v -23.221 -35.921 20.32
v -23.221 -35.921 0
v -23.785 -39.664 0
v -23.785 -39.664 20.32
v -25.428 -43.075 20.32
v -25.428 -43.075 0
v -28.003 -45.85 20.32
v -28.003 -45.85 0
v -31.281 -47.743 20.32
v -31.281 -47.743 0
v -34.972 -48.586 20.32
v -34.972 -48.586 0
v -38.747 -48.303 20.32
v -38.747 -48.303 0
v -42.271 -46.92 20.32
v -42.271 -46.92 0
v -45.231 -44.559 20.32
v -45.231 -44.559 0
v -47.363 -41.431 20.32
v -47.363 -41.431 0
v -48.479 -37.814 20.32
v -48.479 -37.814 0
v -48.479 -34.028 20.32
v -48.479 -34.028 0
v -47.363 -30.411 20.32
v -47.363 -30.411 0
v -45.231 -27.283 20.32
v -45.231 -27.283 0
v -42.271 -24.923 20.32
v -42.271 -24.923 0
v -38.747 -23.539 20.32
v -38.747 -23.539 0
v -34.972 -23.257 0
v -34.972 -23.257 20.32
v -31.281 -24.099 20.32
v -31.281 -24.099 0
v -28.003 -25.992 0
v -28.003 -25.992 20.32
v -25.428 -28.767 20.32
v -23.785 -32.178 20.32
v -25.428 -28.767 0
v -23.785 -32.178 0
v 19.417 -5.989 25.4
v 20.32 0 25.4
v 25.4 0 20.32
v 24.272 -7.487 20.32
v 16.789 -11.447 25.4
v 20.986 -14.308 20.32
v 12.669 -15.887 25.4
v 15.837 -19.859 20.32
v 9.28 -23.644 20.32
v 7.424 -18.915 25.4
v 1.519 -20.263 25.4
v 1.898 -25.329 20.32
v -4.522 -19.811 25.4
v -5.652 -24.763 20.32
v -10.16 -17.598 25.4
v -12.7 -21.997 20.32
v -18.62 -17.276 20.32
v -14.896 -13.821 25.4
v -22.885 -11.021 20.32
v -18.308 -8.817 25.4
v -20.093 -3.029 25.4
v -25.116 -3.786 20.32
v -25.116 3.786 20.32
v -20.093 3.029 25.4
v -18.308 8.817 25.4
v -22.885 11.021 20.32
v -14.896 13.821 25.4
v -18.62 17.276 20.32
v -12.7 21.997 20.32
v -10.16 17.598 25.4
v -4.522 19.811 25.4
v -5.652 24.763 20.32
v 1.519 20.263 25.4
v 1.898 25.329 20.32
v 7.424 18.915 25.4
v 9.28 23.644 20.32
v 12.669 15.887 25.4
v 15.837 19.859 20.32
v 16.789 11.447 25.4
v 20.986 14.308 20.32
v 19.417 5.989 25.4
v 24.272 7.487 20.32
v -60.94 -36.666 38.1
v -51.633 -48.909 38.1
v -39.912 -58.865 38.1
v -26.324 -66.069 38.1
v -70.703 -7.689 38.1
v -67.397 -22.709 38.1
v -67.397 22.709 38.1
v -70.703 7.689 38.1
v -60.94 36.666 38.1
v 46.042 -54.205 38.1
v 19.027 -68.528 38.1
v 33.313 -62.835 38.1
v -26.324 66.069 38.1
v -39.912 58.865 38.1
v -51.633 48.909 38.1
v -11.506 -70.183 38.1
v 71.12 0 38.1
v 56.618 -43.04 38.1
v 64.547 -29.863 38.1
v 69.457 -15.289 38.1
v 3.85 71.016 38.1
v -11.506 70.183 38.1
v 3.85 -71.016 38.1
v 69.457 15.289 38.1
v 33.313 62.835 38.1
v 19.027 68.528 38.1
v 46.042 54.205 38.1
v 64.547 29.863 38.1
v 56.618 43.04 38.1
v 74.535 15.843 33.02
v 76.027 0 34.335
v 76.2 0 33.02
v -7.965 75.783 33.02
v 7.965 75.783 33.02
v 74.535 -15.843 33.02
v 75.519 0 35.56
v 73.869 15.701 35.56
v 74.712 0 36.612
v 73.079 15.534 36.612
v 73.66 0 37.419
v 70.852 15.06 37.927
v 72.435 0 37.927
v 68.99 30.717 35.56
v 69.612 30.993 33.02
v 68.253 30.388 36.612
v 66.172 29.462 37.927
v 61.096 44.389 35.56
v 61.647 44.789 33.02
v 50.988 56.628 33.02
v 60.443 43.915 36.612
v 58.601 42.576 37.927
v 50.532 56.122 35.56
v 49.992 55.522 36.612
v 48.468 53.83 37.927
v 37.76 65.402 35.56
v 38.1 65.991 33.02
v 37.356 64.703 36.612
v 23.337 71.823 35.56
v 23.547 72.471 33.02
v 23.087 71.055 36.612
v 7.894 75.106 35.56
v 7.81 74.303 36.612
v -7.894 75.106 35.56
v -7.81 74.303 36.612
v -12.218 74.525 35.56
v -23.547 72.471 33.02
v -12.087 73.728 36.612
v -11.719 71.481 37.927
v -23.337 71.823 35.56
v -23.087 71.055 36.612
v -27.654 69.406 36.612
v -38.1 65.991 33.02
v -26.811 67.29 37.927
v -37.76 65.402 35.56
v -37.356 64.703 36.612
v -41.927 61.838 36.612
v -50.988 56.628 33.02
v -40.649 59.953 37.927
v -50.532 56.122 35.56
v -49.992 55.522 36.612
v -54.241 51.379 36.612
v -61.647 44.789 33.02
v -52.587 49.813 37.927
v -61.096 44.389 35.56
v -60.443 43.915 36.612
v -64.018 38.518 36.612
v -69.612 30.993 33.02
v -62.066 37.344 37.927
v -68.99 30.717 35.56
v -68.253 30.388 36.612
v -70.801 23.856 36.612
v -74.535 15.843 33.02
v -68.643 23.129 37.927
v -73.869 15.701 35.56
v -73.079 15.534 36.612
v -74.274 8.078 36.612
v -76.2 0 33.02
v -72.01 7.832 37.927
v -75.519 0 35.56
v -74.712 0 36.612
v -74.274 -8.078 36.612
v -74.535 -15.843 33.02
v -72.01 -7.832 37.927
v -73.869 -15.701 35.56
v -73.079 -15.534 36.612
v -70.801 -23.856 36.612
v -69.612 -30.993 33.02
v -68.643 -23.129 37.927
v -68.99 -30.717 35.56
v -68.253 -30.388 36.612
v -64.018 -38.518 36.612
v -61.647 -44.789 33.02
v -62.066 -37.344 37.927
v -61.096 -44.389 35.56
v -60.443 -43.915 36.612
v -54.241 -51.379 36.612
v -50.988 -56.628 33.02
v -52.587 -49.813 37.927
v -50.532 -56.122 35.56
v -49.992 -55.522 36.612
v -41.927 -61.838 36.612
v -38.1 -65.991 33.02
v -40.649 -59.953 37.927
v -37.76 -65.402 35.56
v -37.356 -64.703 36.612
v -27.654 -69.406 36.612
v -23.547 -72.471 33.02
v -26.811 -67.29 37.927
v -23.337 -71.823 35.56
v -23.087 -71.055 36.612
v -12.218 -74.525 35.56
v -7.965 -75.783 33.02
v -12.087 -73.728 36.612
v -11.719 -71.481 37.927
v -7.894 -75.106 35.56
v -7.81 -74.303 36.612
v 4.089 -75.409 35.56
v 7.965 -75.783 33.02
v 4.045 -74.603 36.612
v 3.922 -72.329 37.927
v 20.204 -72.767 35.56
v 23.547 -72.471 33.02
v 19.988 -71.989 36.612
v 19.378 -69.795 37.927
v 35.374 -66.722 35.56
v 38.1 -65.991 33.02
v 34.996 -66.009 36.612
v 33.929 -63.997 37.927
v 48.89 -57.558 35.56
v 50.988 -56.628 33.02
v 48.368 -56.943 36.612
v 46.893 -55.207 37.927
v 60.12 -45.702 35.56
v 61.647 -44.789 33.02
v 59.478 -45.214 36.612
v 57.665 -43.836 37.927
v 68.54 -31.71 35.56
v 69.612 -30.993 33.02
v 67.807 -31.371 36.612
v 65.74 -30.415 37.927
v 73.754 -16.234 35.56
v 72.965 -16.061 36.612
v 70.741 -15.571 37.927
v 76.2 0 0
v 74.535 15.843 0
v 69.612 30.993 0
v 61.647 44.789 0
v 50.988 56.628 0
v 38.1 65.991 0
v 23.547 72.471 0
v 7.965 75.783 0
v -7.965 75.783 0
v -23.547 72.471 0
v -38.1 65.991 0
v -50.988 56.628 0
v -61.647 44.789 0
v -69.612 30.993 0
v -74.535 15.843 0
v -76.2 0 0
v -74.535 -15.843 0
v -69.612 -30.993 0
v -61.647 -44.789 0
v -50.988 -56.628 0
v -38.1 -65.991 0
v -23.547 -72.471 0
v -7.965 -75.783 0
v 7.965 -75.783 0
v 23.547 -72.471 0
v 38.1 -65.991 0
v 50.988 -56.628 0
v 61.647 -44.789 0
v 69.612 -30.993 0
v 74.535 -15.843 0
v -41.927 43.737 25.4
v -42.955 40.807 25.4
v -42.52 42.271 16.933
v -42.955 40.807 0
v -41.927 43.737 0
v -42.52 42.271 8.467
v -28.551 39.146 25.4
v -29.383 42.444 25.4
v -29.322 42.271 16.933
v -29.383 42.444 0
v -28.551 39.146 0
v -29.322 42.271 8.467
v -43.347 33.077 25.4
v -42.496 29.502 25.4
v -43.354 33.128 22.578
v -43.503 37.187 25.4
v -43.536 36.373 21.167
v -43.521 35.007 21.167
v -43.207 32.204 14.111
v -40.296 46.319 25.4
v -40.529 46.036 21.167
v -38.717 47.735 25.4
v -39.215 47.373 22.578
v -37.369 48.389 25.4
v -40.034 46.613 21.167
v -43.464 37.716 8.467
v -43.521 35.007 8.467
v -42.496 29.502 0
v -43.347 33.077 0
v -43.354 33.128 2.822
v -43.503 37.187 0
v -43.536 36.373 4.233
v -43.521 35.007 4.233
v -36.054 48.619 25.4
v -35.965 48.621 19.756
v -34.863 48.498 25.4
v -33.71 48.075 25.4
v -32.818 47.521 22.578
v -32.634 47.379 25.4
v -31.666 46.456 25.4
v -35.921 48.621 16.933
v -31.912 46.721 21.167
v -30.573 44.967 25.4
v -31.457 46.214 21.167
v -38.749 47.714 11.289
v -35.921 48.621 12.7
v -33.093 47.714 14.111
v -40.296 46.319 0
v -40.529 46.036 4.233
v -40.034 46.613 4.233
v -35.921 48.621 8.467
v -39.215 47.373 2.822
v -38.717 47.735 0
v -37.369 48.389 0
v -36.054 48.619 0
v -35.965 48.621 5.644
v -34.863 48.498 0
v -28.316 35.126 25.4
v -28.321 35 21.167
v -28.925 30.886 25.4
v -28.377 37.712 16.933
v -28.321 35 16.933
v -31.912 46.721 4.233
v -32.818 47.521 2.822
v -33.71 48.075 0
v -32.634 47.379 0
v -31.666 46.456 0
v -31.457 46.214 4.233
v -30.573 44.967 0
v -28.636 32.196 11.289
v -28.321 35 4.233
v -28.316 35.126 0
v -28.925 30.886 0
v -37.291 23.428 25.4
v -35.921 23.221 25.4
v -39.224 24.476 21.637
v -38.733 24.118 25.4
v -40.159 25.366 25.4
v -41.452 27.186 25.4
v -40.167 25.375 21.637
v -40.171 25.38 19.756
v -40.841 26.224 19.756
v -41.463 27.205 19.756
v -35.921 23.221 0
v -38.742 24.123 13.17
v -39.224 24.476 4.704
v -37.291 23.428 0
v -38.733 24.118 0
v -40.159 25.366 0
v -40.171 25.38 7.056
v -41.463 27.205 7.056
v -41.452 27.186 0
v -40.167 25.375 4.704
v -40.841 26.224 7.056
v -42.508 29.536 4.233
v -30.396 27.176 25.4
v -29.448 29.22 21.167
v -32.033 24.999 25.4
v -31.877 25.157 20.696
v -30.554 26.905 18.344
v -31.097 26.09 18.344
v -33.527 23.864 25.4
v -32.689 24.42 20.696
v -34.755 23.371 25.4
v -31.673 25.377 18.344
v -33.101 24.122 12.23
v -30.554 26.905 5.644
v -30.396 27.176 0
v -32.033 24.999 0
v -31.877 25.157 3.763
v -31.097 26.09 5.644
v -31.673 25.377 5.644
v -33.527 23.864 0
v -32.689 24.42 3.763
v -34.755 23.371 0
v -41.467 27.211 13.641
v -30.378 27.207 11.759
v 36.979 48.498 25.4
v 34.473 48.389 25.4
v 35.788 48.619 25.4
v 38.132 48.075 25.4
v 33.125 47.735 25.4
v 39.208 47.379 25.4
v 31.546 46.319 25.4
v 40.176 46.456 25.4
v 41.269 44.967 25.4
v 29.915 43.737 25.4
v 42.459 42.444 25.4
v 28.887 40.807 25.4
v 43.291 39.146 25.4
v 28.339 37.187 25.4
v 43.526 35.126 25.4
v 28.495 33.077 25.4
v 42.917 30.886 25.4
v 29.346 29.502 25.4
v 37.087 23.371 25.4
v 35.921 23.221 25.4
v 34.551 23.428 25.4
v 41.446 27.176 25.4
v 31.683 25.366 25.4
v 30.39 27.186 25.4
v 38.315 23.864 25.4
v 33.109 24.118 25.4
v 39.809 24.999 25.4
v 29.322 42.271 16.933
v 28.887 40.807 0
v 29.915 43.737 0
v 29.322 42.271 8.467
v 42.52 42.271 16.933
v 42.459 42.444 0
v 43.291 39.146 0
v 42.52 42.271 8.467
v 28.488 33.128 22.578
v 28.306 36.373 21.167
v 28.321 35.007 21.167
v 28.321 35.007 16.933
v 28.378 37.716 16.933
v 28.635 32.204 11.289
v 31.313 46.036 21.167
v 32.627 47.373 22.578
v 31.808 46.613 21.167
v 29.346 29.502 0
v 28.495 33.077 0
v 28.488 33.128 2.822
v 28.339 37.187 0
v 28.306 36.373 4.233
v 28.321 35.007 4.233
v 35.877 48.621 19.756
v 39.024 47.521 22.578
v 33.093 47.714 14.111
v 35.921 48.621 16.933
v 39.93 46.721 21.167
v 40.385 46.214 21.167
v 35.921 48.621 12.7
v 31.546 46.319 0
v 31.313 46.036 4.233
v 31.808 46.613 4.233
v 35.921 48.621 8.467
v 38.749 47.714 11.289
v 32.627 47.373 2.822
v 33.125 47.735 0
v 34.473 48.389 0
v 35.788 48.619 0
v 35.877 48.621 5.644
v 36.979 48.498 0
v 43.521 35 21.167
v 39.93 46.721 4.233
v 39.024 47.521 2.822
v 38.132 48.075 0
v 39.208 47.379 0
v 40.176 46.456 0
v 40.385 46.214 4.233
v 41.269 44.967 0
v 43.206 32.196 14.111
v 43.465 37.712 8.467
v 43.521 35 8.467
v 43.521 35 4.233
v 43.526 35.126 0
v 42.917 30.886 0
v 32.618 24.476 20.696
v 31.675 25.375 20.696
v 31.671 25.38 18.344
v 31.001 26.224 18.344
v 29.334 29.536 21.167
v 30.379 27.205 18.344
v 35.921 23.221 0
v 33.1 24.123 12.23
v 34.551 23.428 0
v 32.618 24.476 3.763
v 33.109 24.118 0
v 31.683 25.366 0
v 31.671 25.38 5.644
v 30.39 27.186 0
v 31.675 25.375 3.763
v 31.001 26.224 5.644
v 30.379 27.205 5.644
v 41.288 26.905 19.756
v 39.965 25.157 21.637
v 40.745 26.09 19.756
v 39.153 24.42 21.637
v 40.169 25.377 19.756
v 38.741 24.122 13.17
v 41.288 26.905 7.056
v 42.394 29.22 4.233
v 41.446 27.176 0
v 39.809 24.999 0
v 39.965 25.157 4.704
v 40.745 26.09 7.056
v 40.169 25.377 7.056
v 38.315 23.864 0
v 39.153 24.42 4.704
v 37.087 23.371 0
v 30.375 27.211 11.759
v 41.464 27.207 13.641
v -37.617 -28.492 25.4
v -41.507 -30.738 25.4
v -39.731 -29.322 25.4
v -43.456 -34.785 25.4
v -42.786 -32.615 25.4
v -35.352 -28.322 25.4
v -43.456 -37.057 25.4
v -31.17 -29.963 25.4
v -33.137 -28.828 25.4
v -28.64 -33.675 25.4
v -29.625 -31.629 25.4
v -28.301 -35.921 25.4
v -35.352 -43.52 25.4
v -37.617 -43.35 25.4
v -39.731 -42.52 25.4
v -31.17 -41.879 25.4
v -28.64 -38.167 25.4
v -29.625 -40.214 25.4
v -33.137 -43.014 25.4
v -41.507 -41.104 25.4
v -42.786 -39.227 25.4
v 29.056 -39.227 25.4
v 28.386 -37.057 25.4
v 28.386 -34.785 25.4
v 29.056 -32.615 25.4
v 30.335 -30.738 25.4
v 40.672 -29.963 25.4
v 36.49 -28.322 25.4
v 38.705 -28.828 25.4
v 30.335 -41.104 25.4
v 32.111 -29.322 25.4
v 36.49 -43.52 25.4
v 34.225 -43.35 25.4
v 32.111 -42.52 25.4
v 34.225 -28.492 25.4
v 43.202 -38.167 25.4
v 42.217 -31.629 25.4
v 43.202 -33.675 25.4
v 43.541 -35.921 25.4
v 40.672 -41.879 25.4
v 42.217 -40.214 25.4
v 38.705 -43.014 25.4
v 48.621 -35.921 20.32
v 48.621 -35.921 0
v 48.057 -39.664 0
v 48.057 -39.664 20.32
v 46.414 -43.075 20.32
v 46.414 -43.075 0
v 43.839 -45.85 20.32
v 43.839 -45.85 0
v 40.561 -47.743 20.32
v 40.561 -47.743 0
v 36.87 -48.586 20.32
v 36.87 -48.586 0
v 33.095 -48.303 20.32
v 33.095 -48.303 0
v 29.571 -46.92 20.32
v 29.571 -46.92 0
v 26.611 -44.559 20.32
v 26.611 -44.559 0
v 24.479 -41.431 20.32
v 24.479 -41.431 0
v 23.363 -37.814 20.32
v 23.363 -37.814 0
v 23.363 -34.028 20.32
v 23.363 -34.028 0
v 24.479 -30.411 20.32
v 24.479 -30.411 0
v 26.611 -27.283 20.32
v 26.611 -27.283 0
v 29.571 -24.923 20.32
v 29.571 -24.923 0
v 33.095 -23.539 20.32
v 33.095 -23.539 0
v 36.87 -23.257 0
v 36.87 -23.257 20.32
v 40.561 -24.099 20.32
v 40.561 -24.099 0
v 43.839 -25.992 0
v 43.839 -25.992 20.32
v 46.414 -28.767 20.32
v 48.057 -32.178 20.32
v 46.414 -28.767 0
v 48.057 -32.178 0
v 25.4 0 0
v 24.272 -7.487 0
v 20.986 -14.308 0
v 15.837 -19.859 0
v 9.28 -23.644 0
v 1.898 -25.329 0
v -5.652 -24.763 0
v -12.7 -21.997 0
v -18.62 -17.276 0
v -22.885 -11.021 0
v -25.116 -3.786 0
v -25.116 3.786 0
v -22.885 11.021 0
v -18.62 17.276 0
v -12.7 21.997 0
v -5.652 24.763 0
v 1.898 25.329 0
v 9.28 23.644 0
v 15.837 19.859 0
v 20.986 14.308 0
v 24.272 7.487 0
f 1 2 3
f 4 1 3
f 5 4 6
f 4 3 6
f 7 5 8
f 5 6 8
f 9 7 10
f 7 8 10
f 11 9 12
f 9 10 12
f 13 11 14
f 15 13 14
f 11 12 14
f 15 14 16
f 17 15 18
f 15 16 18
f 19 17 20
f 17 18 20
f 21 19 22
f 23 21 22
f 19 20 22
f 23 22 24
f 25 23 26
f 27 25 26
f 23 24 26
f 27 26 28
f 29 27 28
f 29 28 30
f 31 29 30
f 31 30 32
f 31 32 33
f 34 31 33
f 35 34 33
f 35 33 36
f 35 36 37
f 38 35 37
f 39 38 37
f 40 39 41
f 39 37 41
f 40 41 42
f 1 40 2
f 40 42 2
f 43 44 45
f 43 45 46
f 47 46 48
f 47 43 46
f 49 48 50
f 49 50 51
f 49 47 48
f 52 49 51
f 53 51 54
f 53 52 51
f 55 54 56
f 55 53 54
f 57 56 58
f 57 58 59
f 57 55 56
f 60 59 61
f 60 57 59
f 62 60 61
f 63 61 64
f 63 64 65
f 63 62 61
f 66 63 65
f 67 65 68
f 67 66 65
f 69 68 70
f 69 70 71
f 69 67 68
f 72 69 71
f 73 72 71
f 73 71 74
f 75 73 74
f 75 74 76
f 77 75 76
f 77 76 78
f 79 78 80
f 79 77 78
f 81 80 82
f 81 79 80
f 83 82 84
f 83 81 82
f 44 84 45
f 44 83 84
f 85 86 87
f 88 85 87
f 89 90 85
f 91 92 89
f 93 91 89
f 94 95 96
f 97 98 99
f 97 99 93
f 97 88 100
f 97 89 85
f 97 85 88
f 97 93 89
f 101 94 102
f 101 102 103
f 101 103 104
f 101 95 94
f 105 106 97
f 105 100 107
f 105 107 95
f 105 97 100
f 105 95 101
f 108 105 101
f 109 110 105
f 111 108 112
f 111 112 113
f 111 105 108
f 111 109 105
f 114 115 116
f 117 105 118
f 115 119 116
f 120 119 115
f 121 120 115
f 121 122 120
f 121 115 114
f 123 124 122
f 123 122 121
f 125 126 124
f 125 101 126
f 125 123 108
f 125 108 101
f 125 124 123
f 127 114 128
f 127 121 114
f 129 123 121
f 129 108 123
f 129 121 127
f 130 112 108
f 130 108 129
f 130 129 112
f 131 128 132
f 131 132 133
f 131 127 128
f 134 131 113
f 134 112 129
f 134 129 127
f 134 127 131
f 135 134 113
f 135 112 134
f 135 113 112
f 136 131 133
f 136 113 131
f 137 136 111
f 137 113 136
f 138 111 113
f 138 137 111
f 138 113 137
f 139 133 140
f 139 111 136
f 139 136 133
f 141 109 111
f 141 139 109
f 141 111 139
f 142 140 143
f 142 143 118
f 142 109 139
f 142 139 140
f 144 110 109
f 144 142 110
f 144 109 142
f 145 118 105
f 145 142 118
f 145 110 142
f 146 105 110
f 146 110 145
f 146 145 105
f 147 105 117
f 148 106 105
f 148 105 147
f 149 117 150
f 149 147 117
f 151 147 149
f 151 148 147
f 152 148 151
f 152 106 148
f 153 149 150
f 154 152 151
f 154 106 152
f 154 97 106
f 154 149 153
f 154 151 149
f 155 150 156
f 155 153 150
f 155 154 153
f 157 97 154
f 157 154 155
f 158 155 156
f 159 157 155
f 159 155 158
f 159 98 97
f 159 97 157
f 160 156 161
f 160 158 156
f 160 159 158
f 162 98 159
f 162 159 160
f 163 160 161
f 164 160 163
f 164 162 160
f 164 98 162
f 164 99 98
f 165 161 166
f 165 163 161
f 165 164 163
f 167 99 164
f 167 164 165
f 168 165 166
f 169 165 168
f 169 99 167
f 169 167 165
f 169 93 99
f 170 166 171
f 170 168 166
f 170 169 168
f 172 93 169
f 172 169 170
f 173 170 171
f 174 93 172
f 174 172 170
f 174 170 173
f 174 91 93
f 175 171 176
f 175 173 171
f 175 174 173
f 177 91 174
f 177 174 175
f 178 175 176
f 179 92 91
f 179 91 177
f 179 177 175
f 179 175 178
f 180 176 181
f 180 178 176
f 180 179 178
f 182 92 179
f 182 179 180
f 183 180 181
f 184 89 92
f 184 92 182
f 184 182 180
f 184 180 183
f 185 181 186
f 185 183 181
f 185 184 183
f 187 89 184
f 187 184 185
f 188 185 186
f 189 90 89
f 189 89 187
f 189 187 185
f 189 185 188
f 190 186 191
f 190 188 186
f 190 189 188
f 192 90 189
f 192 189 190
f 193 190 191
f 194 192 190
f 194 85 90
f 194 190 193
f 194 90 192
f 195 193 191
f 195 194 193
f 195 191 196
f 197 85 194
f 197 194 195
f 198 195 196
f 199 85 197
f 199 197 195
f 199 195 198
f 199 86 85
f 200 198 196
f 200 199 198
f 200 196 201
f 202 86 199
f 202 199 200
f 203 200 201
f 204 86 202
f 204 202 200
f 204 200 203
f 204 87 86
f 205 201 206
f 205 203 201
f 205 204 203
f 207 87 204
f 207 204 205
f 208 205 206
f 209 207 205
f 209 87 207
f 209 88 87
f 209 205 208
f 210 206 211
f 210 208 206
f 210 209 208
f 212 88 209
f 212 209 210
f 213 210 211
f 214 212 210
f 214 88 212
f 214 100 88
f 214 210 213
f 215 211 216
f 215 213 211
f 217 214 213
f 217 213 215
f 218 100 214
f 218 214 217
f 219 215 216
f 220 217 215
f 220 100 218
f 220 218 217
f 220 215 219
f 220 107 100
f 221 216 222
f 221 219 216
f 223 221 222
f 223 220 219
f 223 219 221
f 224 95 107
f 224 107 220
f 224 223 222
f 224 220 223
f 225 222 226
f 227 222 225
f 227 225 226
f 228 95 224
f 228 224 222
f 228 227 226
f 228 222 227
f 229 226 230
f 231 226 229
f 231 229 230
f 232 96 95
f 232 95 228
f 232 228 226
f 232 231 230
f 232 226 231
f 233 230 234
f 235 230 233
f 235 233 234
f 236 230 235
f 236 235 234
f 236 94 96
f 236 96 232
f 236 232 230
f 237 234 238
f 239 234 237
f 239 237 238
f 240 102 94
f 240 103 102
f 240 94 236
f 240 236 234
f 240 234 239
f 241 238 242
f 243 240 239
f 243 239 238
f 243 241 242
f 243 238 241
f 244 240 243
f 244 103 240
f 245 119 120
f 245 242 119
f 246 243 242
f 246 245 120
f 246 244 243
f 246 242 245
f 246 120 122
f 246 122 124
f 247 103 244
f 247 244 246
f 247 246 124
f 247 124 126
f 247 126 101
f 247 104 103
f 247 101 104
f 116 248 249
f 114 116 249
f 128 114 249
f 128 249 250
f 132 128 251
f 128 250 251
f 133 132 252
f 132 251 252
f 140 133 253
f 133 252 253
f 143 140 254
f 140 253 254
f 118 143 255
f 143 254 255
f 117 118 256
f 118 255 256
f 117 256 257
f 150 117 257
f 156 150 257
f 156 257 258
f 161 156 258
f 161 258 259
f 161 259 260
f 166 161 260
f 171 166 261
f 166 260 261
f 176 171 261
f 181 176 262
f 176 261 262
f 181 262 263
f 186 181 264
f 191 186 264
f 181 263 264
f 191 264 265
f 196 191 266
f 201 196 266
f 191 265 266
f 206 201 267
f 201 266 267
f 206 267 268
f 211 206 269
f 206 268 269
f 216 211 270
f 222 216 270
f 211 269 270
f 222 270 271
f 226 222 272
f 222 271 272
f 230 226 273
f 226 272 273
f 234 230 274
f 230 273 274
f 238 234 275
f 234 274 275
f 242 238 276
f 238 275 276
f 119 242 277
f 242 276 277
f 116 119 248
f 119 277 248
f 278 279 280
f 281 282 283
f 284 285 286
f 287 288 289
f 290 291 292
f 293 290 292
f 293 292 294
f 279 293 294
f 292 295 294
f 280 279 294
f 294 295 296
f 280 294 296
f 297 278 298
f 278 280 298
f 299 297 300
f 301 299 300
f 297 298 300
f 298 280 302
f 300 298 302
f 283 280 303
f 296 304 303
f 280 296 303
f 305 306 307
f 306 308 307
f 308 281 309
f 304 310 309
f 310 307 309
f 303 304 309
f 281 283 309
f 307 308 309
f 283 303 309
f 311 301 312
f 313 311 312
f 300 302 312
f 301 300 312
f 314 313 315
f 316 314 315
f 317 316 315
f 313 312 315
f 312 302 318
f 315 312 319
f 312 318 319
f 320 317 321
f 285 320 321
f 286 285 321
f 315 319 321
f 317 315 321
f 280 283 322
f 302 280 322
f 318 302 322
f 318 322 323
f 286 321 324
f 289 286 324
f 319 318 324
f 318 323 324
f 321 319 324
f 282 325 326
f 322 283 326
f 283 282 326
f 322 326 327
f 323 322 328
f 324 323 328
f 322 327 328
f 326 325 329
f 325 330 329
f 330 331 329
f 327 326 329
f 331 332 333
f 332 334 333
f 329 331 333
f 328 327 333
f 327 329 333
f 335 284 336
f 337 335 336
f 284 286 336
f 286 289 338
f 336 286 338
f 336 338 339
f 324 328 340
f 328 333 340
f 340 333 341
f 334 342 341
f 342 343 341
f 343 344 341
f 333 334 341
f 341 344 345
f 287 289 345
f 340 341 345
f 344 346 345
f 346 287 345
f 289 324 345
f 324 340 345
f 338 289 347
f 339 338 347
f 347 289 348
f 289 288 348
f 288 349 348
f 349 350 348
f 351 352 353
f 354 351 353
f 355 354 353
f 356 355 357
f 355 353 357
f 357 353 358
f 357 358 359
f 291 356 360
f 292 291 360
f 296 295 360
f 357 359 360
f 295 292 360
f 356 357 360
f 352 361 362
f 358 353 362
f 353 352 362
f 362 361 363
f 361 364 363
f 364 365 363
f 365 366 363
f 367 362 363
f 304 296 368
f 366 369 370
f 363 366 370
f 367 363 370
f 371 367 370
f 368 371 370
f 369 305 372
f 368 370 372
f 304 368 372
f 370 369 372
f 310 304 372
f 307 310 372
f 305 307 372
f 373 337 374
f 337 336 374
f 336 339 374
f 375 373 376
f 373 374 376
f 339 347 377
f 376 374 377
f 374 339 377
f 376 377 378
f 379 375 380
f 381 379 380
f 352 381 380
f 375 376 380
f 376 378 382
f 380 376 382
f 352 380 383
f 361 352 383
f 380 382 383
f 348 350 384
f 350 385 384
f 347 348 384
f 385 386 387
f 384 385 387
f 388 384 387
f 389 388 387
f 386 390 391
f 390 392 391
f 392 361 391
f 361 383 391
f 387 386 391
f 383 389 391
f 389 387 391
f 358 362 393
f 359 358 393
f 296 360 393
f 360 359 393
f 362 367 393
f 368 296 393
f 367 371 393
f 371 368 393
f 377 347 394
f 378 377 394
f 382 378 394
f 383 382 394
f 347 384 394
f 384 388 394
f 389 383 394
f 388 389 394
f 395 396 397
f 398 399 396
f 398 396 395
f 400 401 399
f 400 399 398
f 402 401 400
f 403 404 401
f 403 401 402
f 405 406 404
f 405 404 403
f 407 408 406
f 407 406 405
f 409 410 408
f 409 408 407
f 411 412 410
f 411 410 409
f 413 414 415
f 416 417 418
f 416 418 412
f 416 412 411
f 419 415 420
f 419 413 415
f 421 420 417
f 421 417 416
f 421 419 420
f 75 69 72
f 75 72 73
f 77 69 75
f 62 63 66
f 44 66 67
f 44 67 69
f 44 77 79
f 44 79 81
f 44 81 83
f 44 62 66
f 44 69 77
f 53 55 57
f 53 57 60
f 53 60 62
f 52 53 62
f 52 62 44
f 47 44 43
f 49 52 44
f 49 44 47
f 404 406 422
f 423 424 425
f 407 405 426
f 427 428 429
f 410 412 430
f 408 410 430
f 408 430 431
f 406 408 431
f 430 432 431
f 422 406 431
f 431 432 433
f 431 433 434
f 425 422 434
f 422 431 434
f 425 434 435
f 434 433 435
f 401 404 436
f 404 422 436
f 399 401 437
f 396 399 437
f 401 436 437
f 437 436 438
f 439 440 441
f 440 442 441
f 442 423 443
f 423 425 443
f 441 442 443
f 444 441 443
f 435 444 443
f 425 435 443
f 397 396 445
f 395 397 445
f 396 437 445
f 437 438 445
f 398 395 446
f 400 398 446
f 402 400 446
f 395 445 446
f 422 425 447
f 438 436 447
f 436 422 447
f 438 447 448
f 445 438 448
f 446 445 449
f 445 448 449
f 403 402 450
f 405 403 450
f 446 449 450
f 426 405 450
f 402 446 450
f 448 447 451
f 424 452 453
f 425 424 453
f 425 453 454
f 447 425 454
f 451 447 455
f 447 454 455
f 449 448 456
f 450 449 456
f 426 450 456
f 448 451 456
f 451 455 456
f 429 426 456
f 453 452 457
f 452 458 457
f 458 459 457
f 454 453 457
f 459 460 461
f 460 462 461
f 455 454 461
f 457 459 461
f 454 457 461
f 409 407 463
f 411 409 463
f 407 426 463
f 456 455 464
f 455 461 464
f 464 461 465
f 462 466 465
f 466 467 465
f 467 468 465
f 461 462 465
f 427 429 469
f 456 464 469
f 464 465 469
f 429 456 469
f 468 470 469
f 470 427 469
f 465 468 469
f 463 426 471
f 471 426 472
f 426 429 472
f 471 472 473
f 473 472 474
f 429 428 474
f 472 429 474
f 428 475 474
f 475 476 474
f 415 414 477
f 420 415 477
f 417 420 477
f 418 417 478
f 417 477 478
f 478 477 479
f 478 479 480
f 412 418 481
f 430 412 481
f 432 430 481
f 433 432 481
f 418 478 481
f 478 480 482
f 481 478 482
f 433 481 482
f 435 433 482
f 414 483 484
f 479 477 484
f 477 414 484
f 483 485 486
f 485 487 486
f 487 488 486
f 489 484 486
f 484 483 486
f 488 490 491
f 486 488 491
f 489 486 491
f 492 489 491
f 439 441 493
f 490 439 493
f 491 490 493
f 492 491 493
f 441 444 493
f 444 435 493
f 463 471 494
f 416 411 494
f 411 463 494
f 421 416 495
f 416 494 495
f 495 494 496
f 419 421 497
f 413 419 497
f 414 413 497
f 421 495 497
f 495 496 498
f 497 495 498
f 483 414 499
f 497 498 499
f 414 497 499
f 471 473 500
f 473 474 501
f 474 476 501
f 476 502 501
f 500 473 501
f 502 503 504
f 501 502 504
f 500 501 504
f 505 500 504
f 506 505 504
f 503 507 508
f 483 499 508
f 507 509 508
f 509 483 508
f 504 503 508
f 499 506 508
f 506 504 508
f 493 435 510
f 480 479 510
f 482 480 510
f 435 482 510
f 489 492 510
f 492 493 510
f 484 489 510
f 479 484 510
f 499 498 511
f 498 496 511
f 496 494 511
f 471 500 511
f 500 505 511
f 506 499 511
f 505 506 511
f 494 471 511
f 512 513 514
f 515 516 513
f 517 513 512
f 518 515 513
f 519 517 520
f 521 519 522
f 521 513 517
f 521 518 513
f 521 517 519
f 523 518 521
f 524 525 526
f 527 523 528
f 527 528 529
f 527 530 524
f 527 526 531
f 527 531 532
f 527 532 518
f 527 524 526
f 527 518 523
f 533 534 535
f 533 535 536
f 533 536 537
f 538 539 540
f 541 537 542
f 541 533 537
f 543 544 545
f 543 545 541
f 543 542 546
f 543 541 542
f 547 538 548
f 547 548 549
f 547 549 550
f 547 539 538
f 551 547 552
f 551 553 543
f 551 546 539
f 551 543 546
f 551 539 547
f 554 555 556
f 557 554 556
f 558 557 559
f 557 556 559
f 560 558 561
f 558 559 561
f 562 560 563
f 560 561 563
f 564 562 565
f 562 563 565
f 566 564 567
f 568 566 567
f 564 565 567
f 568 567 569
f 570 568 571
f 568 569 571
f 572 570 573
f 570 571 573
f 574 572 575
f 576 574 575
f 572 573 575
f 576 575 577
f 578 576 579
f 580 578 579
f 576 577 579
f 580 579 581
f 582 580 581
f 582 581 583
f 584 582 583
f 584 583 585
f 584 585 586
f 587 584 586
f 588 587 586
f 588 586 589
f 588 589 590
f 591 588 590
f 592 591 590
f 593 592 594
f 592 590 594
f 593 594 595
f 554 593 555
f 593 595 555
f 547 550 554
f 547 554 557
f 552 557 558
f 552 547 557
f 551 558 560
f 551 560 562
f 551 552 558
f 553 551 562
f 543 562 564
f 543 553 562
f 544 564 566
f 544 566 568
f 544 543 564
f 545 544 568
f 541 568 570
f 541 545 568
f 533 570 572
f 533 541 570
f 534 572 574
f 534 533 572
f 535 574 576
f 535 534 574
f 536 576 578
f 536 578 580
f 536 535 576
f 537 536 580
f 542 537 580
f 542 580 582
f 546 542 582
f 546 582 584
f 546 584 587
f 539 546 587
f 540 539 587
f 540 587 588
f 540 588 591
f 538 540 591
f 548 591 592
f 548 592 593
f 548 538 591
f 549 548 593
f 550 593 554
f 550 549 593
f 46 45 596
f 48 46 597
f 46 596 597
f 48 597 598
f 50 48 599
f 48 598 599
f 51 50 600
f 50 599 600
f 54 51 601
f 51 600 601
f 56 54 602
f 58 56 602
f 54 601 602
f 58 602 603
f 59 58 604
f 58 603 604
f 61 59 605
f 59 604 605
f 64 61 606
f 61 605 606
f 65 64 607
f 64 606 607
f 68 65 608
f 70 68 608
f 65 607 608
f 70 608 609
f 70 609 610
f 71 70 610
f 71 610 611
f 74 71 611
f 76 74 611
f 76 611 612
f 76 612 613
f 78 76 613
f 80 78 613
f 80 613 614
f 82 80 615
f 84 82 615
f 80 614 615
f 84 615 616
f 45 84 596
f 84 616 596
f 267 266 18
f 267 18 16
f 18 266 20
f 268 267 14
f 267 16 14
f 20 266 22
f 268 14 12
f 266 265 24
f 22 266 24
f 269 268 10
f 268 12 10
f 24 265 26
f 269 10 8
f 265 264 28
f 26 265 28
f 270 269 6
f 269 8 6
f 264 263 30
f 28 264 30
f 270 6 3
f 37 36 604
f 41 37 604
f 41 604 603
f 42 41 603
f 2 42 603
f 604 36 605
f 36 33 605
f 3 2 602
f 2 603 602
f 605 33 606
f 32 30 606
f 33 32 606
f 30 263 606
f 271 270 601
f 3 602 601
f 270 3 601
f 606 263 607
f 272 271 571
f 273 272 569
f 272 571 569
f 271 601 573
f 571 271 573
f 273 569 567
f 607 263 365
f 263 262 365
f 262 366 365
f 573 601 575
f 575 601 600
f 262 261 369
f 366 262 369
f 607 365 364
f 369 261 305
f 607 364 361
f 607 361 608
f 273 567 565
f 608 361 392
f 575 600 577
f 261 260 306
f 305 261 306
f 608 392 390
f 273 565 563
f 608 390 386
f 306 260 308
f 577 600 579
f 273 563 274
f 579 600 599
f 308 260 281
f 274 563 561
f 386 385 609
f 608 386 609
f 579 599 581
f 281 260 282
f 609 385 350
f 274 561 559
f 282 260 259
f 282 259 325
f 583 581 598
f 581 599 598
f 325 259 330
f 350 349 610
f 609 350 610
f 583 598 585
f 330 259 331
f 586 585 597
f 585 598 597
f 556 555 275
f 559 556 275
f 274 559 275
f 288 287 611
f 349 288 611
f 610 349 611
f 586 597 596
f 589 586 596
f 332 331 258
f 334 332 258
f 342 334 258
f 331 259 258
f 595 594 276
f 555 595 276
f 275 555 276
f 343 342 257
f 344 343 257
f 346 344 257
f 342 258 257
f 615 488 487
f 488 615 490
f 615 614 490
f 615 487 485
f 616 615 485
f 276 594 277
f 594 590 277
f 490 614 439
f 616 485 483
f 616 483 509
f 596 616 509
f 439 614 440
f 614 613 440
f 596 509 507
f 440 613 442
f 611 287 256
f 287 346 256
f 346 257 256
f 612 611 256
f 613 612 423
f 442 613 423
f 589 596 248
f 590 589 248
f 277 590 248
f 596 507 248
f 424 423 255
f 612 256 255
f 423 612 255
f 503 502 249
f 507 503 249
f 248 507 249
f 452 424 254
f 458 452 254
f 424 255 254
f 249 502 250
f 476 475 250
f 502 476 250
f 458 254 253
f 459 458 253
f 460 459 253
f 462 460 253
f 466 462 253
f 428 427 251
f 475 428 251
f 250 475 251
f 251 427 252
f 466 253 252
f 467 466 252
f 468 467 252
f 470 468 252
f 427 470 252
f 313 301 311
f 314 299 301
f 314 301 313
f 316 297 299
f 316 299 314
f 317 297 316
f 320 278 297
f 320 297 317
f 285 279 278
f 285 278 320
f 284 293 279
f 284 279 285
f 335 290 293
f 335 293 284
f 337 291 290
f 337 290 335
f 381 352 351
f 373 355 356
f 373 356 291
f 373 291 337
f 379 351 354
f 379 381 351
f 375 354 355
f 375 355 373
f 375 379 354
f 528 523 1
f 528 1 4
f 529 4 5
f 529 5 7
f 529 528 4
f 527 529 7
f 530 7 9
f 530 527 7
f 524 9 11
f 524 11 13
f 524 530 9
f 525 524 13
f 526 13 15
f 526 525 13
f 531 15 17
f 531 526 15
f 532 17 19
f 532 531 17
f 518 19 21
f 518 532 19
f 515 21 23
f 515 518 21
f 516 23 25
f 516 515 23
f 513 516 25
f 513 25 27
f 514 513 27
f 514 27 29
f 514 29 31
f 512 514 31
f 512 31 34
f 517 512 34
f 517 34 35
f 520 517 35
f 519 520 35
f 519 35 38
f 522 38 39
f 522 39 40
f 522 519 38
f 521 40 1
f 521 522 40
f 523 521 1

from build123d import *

# Parameters (mm, degrees)
F0_R     = 76.2
F0_R_2   = 12.7
F0_R_3   = 31.75
F1_DEPTH = 38.1
F2_R     = 25.4
F2_R_2   = 12.7
F3_DEPTH = 25.4
F4_R     = 5.08
F5_SIZE  = 5.08
F6_SIZE  = 5.08


with BuildPart() as f1:
    # F0 (on Top) → F1 (new body)
    with BuildSketch(Plane.XY):
        Circle(F0_R)
        with BuildLine():
            add(Edge.make_bspline(
                [(-35.921024, -48.621024), (-22.722797, -48.621024), (-29.321911, -29.571024), (-35.921024, -10.521024), (-42.520138, -29.571024), (-49.119252, -48.621024), (-35.921024, -48.621024)],
                knots=[0, 0, 0, 2.094395, 2.094395, 4.18879, 4.18879, 6.283185, 6.283185, 6.283185], degree=2, weights=[1, 0.5, 1, 0.5, 1, 0.5, 1]))
        make_face(mode=Mode.SUBTRACT)
        with BuildLine():
            add(Edge.make_bspline(
                [(35.921024, -48.621024), (49.119252, -48.621024), (42.520138, -29.571024), (35.921024, -10.521024), (29.321911, -29.571024), (22.722797, -48.621024), (35.921024, -48.621024)],
                knots=[0, 0, 0, 2.094395, 2.094395, 4.18879, 4.18879, 6.283185, 6.283185, 6.283185], degree=2, weights=[1, 0.5, 1, 0.5, 1, 0.5, 1]))
        make_face(mode=Mode.SUBTRACT)
        with Locations((-35.921024, 35.921024)):
            Circle(F0_R_2, mode=Mode.SUBTRACT)
        Circle(F0_R_3, mode=Mode.SUBTRACT)
        with Locations((35.921024, 35.921024)):
            Circle(F0_R_2, mode=Mode.SUBTRACT)
        with Locations((-35.921024, 35.921024)):
            Circle(F0_R_2)
        Circle(F0_R_3)
        with Locations((35.921024, 35.921024)):
            Circle(F0_R_2)
        with BuildLine():
            add(Edge.make_bspline(
                [(35.921024, -48.621024), (49.119252, -48.621024), (42.520138, -29.571024), (35.921024, -10.521024), (29.321911, -29.571024), (22.722797, -48.621024), (35.921024, -48.621024)],
                knots=[0, 0, 0, 2.094395, 2.094395, 4.18879, 4.18879, 6.283185, 6.283185, 6.283185], degree=2, weights=[1, 0.5, 1, 0.5, 1, 0.5, 1]))
        make_face()
        with BuildLine():
            add(Edge.make_bspline(
                [(-35.921024, -48.621024), (-22.722797, -48.621024), (-29.321911, -29.571024), (-35.921024, -10.521024), (-42.520138, -29.571024), (-49.119252, -48.621024), (-35.921024, -48.621024)],
                knots=[0, 0, 0, 2.094395, 2.094395, 4.18879, 4.18879, 6.283185, 6.283185, 6.283185], degree=2, weights=[1, 0.5, 1, 0.5, 1, 0.5, 1]))
        make_face()
    extrude(amount=F1_DEPTH)

    # F2 (on face) → F3 (cut)
    with BuildSketch(Plane(origin=(0, 0, 0), x_dir=(1, 0, 0), z_dir=(0, 0, -1))):
        Circle(F2_R)
        with Locations((35.921024, 35.921024)):
            Circle(F2_R_2)
        with Locations((-35.921024, 35.921024)):
            Circle(F2_R_2)
        with BuildLine():
            add(Edge.make_bspline(
                [(-35.921024, -23.221024), (-49.119252, -23.221024), (-42.520138, -42.271024), (-35.921024, -61.321024), (-29.321911, -42.271024), (-22.722797, -23.221024), (-35.921024, -23.221024)],
                knots=[0, 0, 0, 2.094395, 2.094395, 4.18879, 4.18879, 6.283185, 6.283185, 6.283185], degree=2, weights=[1, 0.5, 1, 0.5, 1, 0.5, 1]))
        make_face()
        with BuildLine():
            add(Edge.make_bspline(
                [(35.921024, -23.221024), (22.722797, -23.221024), (29.321911, -42.271024), (35.921024, -61.321024), (42.520138, -42.271024), (49.119252, -23.221024), (35.921024, -23.221024)],
                knots=[0, 0, 0, 2.094395, 2.094395, 4.18879, 4.18879, 6.283185, 6.283185, 6.283185], degree=2, weights=[1, 0.5, 1, 0.5, 1, 0.5, 1]))
        make_face()
    extrude(amount=-F3_DEPTH, mode=Mode.SUBTRACT)

    # F4
    f4_edges = [f1.edges().sort_by_distance(p)[0] for p in [
        (-76.2, 0, 38.1),
    ]]
    fillet(f4_edges, radius=F4_R)

    # F5
    f5_edges = [f1.edges().sort_by_distance(p)[0] for p in [
        (-25.4, 0, 25.4),
        (23.221024, -35.921024, 25.4),
    ]]
    chamfer(f5_edges, length=F5_SIZE)

    # F6
    f6_edges = [f1.edges().sort_by_distance(p)[0] for p in [
        (-48.621024, -35.921024, 25.4),
    ]]
    chamfer(f6_edges, length=F6_SIZE)


solid = f1.part
